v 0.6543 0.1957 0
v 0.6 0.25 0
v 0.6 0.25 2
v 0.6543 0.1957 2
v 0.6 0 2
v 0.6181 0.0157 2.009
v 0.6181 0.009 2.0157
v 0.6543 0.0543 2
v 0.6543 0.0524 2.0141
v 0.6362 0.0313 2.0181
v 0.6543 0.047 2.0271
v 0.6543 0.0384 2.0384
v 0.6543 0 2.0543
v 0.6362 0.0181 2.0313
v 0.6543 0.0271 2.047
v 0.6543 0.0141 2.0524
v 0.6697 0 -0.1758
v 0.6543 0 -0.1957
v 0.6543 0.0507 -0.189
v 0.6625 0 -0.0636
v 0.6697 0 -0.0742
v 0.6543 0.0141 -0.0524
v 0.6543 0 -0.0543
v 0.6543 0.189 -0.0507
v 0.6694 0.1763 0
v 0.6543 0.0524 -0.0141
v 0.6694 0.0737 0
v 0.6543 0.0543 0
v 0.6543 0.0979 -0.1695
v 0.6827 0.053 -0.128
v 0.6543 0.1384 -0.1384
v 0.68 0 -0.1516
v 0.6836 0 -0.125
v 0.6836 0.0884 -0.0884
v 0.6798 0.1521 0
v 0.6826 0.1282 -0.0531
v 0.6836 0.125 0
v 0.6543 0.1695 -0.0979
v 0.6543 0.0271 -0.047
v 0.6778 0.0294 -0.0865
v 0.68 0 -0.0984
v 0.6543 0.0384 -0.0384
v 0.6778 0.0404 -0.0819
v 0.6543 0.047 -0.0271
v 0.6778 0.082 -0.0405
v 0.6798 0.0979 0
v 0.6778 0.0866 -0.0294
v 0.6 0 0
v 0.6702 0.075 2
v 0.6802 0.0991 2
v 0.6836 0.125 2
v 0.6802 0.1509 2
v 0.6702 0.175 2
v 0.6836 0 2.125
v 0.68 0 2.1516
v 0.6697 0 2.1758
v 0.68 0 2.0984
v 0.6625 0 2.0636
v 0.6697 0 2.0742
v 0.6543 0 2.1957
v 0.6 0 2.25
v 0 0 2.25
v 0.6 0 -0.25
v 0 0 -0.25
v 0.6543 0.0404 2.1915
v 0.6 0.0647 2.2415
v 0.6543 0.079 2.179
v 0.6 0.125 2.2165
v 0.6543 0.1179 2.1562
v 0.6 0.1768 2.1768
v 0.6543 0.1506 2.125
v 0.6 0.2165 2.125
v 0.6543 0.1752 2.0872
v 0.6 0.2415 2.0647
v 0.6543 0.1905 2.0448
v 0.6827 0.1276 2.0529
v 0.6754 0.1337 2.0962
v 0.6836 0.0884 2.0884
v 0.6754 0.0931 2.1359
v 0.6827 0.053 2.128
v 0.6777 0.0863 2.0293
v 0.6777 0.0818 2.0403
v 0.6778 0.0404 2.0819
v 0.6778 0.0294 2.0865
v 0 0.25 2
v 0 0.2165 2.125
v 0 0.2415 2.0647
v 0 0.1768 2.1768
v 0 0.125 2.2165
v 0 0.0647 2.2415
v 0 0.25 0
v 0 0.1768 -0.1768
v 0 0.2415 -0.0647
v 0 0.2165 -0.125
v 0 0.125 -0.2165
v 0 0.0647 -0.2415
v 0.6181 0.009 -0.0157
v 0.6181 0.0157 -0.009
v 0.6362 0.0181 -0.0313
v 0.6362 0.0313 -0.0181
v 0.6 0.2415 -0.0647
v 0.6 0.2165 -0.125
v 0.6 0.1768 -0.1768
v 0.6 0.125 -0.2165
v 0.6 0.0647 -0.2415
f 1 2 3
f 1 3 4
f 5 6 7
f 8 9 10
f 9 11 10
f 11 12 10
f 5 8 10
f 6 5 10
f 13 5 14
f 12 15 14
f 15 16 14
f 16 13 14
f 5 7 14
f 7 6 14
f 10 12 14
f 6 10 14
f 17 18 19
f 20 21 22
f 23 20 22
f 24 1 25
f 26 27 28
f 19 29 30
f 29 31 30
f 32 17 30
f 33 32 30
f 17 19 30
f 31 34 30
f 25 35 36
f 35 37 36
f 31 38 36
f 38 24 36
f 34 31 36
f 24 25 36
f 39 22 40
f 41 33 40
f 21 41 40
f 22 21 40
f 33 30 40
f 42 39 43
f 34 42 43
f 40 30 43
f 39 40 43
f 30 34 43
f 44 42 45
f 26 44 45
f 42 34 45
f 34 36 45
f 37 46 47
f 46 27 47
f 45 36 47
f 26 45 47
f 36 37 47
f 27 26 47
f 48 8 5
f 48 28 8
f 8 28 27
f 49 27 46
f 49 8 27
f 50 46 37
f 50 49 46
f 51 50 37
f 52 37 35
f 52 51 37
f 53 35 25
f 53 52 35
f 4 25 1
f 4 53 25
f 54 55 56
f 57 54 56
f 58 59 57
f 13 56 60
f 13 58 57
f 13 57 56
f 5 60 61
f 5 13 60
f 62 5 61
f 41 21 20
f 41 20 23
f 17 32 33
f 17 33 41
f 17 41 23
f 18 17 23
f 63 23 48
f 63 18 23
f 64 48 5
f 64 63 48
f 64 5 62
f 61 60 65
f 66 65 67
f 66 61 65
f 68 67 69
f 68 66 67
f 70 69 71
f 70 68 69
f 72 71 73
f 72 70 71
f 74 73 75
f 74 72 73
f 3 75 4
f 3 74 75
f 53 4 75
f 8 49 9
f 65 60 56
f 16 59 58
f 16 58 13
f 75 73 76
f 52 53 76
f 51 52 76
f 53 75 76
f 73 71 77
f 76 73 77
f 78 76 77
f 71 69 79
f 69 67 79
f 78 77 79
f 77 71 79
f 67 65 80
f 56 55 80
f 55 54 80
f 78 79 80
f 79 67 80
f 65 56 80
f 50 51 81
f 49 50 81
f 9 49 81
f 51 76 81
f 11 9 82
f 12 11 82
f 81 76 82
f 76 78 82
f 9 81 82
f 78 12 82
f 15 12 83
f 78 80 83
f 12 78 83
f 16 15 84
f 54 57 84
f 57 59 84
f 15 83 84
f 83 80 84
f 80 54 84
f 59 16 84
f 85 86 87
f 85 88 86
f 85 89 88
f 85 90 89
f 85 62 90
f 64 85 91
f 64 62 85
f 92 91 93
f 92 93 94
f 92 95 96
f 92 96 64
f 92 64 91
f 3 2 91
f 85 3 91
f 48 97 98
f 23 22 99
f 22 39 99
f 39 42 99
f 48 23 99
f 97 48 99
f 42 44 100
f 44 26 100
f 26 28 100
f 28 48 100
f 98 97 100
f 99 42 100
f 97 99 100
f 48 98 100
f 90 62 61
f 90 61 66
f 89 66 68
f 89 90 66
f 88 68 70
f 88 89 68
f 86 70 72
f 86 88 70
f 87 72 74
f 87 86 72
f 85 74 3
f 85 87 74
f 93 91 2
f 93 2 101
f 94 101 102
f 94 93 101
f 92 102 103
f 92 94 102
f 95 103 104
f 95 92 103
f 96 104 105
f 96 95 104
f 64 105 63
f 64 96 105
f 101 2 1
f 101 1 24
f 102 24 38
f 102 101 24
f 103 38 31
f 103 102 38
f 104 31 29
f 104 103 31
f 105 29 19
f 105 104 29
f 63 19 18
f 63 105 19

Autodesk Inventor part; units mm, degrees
ref_plane "YZ Plane" through (0, 0, 0) normal (1, 0, 0) x (0, 1, 0)
ref_plane "XZ Plane" through (0, 0, 0) normal (0, 1, 0) x (-1, 0, 0)
ref_plane "XY Plane" through (0, 0, 0) normal (0, 0, 1) x (1, 0, 0)
sketch "草圖1" plane through (0, 0, 0) normal (0, 0, 1) x (1, 0, 0)
  line L0 (0, 0) -> (0.6, 0)
  line L1 (0.6, 0) -> (0.6, 0.25)
  line L2 (0.6, 0.25) -> (0, 0.25)
  line L3 (0, 0.25) -> (0, 0)
  line L4 (0.6, 0.25) -> (0.725, 0.125)
  line L5 (0.725, 0.125) -> (0.6, 0)
  dimension "d0" = 0.6
  dimension "d1" = 0.25
  dimension "d2" = 45
extrude "擠出1" add sketch "草圖1" along normal blind 2
sketch "草圖2" plane through (0, 0, 2) normal (0, 0, 1) x (1, 0, 0)
  line L0 (0, 0.25) -> (0, 0) projected
  line L1 (0, 0.25) -> (0, 0)
  line L2 (0, 0.25) -> (0, 0) projected
  line L3 (0, 0) -> (0.6, 0) projected
  line L4 (0.6, 0) -> (0.725, 0.125) projected
  line L5 (0.725, 0.125) -> (0.6, 0.25) projected
  line L6 (0.6, 0.25) -> (0, 0.25) projected
  line L7 (0.6, 0.25) -> (0.725, 0.125)
  line L8 (0, 0) -> (0.6, 0) projected
  line L9 (0.6, 0) -> (0, 0)
  line L10 (0, 0) -> (0, 0.25)
  line L11 (0.6, 0.25) -> (0, 0.25)
revolve "迴轉1" add sketch "草圖2" angle 90 about axis through (0, 0, 2) along (1, 0, 0)
sketch "草圖3" plane through (0, 0, 0) normal (0, 0, -1) x (-1, 0, 0)
  line L0 (-0.6, 0.25) -> (0, 0.25) projected
  line L1 (-0.725, 0.125) -> (-0.6, 0.25) projected
  line L2 (-0.6, 0.25) -> (-0.725, 0.125)
  line L3 (-0.725, 0.125) -> (-0.6, 0)
  line L4 (0, 0) -> (-0.6, 0) projected
  line L5 (-0.6, 0) -> (0, 0)
  line L6 (0, 0.25) -> (0, 0) projected
  line L7 (0, 0) -> (0, 0.25)
  line L8 (0, 0.25) -> (-0.6, 0.25)
revolve "迴轉2" add sketch "草圖3" angle 90 about axis through (0, 0, 0) along (-1, 0, 0)
fillet "圓角1" radius 0.1 3 edges at (0.725, 0.0884, 2.0884) (0.725, 0.0884, -0.0884) (0.725, 0.125, 1)
properties part number "窗頂_2"
